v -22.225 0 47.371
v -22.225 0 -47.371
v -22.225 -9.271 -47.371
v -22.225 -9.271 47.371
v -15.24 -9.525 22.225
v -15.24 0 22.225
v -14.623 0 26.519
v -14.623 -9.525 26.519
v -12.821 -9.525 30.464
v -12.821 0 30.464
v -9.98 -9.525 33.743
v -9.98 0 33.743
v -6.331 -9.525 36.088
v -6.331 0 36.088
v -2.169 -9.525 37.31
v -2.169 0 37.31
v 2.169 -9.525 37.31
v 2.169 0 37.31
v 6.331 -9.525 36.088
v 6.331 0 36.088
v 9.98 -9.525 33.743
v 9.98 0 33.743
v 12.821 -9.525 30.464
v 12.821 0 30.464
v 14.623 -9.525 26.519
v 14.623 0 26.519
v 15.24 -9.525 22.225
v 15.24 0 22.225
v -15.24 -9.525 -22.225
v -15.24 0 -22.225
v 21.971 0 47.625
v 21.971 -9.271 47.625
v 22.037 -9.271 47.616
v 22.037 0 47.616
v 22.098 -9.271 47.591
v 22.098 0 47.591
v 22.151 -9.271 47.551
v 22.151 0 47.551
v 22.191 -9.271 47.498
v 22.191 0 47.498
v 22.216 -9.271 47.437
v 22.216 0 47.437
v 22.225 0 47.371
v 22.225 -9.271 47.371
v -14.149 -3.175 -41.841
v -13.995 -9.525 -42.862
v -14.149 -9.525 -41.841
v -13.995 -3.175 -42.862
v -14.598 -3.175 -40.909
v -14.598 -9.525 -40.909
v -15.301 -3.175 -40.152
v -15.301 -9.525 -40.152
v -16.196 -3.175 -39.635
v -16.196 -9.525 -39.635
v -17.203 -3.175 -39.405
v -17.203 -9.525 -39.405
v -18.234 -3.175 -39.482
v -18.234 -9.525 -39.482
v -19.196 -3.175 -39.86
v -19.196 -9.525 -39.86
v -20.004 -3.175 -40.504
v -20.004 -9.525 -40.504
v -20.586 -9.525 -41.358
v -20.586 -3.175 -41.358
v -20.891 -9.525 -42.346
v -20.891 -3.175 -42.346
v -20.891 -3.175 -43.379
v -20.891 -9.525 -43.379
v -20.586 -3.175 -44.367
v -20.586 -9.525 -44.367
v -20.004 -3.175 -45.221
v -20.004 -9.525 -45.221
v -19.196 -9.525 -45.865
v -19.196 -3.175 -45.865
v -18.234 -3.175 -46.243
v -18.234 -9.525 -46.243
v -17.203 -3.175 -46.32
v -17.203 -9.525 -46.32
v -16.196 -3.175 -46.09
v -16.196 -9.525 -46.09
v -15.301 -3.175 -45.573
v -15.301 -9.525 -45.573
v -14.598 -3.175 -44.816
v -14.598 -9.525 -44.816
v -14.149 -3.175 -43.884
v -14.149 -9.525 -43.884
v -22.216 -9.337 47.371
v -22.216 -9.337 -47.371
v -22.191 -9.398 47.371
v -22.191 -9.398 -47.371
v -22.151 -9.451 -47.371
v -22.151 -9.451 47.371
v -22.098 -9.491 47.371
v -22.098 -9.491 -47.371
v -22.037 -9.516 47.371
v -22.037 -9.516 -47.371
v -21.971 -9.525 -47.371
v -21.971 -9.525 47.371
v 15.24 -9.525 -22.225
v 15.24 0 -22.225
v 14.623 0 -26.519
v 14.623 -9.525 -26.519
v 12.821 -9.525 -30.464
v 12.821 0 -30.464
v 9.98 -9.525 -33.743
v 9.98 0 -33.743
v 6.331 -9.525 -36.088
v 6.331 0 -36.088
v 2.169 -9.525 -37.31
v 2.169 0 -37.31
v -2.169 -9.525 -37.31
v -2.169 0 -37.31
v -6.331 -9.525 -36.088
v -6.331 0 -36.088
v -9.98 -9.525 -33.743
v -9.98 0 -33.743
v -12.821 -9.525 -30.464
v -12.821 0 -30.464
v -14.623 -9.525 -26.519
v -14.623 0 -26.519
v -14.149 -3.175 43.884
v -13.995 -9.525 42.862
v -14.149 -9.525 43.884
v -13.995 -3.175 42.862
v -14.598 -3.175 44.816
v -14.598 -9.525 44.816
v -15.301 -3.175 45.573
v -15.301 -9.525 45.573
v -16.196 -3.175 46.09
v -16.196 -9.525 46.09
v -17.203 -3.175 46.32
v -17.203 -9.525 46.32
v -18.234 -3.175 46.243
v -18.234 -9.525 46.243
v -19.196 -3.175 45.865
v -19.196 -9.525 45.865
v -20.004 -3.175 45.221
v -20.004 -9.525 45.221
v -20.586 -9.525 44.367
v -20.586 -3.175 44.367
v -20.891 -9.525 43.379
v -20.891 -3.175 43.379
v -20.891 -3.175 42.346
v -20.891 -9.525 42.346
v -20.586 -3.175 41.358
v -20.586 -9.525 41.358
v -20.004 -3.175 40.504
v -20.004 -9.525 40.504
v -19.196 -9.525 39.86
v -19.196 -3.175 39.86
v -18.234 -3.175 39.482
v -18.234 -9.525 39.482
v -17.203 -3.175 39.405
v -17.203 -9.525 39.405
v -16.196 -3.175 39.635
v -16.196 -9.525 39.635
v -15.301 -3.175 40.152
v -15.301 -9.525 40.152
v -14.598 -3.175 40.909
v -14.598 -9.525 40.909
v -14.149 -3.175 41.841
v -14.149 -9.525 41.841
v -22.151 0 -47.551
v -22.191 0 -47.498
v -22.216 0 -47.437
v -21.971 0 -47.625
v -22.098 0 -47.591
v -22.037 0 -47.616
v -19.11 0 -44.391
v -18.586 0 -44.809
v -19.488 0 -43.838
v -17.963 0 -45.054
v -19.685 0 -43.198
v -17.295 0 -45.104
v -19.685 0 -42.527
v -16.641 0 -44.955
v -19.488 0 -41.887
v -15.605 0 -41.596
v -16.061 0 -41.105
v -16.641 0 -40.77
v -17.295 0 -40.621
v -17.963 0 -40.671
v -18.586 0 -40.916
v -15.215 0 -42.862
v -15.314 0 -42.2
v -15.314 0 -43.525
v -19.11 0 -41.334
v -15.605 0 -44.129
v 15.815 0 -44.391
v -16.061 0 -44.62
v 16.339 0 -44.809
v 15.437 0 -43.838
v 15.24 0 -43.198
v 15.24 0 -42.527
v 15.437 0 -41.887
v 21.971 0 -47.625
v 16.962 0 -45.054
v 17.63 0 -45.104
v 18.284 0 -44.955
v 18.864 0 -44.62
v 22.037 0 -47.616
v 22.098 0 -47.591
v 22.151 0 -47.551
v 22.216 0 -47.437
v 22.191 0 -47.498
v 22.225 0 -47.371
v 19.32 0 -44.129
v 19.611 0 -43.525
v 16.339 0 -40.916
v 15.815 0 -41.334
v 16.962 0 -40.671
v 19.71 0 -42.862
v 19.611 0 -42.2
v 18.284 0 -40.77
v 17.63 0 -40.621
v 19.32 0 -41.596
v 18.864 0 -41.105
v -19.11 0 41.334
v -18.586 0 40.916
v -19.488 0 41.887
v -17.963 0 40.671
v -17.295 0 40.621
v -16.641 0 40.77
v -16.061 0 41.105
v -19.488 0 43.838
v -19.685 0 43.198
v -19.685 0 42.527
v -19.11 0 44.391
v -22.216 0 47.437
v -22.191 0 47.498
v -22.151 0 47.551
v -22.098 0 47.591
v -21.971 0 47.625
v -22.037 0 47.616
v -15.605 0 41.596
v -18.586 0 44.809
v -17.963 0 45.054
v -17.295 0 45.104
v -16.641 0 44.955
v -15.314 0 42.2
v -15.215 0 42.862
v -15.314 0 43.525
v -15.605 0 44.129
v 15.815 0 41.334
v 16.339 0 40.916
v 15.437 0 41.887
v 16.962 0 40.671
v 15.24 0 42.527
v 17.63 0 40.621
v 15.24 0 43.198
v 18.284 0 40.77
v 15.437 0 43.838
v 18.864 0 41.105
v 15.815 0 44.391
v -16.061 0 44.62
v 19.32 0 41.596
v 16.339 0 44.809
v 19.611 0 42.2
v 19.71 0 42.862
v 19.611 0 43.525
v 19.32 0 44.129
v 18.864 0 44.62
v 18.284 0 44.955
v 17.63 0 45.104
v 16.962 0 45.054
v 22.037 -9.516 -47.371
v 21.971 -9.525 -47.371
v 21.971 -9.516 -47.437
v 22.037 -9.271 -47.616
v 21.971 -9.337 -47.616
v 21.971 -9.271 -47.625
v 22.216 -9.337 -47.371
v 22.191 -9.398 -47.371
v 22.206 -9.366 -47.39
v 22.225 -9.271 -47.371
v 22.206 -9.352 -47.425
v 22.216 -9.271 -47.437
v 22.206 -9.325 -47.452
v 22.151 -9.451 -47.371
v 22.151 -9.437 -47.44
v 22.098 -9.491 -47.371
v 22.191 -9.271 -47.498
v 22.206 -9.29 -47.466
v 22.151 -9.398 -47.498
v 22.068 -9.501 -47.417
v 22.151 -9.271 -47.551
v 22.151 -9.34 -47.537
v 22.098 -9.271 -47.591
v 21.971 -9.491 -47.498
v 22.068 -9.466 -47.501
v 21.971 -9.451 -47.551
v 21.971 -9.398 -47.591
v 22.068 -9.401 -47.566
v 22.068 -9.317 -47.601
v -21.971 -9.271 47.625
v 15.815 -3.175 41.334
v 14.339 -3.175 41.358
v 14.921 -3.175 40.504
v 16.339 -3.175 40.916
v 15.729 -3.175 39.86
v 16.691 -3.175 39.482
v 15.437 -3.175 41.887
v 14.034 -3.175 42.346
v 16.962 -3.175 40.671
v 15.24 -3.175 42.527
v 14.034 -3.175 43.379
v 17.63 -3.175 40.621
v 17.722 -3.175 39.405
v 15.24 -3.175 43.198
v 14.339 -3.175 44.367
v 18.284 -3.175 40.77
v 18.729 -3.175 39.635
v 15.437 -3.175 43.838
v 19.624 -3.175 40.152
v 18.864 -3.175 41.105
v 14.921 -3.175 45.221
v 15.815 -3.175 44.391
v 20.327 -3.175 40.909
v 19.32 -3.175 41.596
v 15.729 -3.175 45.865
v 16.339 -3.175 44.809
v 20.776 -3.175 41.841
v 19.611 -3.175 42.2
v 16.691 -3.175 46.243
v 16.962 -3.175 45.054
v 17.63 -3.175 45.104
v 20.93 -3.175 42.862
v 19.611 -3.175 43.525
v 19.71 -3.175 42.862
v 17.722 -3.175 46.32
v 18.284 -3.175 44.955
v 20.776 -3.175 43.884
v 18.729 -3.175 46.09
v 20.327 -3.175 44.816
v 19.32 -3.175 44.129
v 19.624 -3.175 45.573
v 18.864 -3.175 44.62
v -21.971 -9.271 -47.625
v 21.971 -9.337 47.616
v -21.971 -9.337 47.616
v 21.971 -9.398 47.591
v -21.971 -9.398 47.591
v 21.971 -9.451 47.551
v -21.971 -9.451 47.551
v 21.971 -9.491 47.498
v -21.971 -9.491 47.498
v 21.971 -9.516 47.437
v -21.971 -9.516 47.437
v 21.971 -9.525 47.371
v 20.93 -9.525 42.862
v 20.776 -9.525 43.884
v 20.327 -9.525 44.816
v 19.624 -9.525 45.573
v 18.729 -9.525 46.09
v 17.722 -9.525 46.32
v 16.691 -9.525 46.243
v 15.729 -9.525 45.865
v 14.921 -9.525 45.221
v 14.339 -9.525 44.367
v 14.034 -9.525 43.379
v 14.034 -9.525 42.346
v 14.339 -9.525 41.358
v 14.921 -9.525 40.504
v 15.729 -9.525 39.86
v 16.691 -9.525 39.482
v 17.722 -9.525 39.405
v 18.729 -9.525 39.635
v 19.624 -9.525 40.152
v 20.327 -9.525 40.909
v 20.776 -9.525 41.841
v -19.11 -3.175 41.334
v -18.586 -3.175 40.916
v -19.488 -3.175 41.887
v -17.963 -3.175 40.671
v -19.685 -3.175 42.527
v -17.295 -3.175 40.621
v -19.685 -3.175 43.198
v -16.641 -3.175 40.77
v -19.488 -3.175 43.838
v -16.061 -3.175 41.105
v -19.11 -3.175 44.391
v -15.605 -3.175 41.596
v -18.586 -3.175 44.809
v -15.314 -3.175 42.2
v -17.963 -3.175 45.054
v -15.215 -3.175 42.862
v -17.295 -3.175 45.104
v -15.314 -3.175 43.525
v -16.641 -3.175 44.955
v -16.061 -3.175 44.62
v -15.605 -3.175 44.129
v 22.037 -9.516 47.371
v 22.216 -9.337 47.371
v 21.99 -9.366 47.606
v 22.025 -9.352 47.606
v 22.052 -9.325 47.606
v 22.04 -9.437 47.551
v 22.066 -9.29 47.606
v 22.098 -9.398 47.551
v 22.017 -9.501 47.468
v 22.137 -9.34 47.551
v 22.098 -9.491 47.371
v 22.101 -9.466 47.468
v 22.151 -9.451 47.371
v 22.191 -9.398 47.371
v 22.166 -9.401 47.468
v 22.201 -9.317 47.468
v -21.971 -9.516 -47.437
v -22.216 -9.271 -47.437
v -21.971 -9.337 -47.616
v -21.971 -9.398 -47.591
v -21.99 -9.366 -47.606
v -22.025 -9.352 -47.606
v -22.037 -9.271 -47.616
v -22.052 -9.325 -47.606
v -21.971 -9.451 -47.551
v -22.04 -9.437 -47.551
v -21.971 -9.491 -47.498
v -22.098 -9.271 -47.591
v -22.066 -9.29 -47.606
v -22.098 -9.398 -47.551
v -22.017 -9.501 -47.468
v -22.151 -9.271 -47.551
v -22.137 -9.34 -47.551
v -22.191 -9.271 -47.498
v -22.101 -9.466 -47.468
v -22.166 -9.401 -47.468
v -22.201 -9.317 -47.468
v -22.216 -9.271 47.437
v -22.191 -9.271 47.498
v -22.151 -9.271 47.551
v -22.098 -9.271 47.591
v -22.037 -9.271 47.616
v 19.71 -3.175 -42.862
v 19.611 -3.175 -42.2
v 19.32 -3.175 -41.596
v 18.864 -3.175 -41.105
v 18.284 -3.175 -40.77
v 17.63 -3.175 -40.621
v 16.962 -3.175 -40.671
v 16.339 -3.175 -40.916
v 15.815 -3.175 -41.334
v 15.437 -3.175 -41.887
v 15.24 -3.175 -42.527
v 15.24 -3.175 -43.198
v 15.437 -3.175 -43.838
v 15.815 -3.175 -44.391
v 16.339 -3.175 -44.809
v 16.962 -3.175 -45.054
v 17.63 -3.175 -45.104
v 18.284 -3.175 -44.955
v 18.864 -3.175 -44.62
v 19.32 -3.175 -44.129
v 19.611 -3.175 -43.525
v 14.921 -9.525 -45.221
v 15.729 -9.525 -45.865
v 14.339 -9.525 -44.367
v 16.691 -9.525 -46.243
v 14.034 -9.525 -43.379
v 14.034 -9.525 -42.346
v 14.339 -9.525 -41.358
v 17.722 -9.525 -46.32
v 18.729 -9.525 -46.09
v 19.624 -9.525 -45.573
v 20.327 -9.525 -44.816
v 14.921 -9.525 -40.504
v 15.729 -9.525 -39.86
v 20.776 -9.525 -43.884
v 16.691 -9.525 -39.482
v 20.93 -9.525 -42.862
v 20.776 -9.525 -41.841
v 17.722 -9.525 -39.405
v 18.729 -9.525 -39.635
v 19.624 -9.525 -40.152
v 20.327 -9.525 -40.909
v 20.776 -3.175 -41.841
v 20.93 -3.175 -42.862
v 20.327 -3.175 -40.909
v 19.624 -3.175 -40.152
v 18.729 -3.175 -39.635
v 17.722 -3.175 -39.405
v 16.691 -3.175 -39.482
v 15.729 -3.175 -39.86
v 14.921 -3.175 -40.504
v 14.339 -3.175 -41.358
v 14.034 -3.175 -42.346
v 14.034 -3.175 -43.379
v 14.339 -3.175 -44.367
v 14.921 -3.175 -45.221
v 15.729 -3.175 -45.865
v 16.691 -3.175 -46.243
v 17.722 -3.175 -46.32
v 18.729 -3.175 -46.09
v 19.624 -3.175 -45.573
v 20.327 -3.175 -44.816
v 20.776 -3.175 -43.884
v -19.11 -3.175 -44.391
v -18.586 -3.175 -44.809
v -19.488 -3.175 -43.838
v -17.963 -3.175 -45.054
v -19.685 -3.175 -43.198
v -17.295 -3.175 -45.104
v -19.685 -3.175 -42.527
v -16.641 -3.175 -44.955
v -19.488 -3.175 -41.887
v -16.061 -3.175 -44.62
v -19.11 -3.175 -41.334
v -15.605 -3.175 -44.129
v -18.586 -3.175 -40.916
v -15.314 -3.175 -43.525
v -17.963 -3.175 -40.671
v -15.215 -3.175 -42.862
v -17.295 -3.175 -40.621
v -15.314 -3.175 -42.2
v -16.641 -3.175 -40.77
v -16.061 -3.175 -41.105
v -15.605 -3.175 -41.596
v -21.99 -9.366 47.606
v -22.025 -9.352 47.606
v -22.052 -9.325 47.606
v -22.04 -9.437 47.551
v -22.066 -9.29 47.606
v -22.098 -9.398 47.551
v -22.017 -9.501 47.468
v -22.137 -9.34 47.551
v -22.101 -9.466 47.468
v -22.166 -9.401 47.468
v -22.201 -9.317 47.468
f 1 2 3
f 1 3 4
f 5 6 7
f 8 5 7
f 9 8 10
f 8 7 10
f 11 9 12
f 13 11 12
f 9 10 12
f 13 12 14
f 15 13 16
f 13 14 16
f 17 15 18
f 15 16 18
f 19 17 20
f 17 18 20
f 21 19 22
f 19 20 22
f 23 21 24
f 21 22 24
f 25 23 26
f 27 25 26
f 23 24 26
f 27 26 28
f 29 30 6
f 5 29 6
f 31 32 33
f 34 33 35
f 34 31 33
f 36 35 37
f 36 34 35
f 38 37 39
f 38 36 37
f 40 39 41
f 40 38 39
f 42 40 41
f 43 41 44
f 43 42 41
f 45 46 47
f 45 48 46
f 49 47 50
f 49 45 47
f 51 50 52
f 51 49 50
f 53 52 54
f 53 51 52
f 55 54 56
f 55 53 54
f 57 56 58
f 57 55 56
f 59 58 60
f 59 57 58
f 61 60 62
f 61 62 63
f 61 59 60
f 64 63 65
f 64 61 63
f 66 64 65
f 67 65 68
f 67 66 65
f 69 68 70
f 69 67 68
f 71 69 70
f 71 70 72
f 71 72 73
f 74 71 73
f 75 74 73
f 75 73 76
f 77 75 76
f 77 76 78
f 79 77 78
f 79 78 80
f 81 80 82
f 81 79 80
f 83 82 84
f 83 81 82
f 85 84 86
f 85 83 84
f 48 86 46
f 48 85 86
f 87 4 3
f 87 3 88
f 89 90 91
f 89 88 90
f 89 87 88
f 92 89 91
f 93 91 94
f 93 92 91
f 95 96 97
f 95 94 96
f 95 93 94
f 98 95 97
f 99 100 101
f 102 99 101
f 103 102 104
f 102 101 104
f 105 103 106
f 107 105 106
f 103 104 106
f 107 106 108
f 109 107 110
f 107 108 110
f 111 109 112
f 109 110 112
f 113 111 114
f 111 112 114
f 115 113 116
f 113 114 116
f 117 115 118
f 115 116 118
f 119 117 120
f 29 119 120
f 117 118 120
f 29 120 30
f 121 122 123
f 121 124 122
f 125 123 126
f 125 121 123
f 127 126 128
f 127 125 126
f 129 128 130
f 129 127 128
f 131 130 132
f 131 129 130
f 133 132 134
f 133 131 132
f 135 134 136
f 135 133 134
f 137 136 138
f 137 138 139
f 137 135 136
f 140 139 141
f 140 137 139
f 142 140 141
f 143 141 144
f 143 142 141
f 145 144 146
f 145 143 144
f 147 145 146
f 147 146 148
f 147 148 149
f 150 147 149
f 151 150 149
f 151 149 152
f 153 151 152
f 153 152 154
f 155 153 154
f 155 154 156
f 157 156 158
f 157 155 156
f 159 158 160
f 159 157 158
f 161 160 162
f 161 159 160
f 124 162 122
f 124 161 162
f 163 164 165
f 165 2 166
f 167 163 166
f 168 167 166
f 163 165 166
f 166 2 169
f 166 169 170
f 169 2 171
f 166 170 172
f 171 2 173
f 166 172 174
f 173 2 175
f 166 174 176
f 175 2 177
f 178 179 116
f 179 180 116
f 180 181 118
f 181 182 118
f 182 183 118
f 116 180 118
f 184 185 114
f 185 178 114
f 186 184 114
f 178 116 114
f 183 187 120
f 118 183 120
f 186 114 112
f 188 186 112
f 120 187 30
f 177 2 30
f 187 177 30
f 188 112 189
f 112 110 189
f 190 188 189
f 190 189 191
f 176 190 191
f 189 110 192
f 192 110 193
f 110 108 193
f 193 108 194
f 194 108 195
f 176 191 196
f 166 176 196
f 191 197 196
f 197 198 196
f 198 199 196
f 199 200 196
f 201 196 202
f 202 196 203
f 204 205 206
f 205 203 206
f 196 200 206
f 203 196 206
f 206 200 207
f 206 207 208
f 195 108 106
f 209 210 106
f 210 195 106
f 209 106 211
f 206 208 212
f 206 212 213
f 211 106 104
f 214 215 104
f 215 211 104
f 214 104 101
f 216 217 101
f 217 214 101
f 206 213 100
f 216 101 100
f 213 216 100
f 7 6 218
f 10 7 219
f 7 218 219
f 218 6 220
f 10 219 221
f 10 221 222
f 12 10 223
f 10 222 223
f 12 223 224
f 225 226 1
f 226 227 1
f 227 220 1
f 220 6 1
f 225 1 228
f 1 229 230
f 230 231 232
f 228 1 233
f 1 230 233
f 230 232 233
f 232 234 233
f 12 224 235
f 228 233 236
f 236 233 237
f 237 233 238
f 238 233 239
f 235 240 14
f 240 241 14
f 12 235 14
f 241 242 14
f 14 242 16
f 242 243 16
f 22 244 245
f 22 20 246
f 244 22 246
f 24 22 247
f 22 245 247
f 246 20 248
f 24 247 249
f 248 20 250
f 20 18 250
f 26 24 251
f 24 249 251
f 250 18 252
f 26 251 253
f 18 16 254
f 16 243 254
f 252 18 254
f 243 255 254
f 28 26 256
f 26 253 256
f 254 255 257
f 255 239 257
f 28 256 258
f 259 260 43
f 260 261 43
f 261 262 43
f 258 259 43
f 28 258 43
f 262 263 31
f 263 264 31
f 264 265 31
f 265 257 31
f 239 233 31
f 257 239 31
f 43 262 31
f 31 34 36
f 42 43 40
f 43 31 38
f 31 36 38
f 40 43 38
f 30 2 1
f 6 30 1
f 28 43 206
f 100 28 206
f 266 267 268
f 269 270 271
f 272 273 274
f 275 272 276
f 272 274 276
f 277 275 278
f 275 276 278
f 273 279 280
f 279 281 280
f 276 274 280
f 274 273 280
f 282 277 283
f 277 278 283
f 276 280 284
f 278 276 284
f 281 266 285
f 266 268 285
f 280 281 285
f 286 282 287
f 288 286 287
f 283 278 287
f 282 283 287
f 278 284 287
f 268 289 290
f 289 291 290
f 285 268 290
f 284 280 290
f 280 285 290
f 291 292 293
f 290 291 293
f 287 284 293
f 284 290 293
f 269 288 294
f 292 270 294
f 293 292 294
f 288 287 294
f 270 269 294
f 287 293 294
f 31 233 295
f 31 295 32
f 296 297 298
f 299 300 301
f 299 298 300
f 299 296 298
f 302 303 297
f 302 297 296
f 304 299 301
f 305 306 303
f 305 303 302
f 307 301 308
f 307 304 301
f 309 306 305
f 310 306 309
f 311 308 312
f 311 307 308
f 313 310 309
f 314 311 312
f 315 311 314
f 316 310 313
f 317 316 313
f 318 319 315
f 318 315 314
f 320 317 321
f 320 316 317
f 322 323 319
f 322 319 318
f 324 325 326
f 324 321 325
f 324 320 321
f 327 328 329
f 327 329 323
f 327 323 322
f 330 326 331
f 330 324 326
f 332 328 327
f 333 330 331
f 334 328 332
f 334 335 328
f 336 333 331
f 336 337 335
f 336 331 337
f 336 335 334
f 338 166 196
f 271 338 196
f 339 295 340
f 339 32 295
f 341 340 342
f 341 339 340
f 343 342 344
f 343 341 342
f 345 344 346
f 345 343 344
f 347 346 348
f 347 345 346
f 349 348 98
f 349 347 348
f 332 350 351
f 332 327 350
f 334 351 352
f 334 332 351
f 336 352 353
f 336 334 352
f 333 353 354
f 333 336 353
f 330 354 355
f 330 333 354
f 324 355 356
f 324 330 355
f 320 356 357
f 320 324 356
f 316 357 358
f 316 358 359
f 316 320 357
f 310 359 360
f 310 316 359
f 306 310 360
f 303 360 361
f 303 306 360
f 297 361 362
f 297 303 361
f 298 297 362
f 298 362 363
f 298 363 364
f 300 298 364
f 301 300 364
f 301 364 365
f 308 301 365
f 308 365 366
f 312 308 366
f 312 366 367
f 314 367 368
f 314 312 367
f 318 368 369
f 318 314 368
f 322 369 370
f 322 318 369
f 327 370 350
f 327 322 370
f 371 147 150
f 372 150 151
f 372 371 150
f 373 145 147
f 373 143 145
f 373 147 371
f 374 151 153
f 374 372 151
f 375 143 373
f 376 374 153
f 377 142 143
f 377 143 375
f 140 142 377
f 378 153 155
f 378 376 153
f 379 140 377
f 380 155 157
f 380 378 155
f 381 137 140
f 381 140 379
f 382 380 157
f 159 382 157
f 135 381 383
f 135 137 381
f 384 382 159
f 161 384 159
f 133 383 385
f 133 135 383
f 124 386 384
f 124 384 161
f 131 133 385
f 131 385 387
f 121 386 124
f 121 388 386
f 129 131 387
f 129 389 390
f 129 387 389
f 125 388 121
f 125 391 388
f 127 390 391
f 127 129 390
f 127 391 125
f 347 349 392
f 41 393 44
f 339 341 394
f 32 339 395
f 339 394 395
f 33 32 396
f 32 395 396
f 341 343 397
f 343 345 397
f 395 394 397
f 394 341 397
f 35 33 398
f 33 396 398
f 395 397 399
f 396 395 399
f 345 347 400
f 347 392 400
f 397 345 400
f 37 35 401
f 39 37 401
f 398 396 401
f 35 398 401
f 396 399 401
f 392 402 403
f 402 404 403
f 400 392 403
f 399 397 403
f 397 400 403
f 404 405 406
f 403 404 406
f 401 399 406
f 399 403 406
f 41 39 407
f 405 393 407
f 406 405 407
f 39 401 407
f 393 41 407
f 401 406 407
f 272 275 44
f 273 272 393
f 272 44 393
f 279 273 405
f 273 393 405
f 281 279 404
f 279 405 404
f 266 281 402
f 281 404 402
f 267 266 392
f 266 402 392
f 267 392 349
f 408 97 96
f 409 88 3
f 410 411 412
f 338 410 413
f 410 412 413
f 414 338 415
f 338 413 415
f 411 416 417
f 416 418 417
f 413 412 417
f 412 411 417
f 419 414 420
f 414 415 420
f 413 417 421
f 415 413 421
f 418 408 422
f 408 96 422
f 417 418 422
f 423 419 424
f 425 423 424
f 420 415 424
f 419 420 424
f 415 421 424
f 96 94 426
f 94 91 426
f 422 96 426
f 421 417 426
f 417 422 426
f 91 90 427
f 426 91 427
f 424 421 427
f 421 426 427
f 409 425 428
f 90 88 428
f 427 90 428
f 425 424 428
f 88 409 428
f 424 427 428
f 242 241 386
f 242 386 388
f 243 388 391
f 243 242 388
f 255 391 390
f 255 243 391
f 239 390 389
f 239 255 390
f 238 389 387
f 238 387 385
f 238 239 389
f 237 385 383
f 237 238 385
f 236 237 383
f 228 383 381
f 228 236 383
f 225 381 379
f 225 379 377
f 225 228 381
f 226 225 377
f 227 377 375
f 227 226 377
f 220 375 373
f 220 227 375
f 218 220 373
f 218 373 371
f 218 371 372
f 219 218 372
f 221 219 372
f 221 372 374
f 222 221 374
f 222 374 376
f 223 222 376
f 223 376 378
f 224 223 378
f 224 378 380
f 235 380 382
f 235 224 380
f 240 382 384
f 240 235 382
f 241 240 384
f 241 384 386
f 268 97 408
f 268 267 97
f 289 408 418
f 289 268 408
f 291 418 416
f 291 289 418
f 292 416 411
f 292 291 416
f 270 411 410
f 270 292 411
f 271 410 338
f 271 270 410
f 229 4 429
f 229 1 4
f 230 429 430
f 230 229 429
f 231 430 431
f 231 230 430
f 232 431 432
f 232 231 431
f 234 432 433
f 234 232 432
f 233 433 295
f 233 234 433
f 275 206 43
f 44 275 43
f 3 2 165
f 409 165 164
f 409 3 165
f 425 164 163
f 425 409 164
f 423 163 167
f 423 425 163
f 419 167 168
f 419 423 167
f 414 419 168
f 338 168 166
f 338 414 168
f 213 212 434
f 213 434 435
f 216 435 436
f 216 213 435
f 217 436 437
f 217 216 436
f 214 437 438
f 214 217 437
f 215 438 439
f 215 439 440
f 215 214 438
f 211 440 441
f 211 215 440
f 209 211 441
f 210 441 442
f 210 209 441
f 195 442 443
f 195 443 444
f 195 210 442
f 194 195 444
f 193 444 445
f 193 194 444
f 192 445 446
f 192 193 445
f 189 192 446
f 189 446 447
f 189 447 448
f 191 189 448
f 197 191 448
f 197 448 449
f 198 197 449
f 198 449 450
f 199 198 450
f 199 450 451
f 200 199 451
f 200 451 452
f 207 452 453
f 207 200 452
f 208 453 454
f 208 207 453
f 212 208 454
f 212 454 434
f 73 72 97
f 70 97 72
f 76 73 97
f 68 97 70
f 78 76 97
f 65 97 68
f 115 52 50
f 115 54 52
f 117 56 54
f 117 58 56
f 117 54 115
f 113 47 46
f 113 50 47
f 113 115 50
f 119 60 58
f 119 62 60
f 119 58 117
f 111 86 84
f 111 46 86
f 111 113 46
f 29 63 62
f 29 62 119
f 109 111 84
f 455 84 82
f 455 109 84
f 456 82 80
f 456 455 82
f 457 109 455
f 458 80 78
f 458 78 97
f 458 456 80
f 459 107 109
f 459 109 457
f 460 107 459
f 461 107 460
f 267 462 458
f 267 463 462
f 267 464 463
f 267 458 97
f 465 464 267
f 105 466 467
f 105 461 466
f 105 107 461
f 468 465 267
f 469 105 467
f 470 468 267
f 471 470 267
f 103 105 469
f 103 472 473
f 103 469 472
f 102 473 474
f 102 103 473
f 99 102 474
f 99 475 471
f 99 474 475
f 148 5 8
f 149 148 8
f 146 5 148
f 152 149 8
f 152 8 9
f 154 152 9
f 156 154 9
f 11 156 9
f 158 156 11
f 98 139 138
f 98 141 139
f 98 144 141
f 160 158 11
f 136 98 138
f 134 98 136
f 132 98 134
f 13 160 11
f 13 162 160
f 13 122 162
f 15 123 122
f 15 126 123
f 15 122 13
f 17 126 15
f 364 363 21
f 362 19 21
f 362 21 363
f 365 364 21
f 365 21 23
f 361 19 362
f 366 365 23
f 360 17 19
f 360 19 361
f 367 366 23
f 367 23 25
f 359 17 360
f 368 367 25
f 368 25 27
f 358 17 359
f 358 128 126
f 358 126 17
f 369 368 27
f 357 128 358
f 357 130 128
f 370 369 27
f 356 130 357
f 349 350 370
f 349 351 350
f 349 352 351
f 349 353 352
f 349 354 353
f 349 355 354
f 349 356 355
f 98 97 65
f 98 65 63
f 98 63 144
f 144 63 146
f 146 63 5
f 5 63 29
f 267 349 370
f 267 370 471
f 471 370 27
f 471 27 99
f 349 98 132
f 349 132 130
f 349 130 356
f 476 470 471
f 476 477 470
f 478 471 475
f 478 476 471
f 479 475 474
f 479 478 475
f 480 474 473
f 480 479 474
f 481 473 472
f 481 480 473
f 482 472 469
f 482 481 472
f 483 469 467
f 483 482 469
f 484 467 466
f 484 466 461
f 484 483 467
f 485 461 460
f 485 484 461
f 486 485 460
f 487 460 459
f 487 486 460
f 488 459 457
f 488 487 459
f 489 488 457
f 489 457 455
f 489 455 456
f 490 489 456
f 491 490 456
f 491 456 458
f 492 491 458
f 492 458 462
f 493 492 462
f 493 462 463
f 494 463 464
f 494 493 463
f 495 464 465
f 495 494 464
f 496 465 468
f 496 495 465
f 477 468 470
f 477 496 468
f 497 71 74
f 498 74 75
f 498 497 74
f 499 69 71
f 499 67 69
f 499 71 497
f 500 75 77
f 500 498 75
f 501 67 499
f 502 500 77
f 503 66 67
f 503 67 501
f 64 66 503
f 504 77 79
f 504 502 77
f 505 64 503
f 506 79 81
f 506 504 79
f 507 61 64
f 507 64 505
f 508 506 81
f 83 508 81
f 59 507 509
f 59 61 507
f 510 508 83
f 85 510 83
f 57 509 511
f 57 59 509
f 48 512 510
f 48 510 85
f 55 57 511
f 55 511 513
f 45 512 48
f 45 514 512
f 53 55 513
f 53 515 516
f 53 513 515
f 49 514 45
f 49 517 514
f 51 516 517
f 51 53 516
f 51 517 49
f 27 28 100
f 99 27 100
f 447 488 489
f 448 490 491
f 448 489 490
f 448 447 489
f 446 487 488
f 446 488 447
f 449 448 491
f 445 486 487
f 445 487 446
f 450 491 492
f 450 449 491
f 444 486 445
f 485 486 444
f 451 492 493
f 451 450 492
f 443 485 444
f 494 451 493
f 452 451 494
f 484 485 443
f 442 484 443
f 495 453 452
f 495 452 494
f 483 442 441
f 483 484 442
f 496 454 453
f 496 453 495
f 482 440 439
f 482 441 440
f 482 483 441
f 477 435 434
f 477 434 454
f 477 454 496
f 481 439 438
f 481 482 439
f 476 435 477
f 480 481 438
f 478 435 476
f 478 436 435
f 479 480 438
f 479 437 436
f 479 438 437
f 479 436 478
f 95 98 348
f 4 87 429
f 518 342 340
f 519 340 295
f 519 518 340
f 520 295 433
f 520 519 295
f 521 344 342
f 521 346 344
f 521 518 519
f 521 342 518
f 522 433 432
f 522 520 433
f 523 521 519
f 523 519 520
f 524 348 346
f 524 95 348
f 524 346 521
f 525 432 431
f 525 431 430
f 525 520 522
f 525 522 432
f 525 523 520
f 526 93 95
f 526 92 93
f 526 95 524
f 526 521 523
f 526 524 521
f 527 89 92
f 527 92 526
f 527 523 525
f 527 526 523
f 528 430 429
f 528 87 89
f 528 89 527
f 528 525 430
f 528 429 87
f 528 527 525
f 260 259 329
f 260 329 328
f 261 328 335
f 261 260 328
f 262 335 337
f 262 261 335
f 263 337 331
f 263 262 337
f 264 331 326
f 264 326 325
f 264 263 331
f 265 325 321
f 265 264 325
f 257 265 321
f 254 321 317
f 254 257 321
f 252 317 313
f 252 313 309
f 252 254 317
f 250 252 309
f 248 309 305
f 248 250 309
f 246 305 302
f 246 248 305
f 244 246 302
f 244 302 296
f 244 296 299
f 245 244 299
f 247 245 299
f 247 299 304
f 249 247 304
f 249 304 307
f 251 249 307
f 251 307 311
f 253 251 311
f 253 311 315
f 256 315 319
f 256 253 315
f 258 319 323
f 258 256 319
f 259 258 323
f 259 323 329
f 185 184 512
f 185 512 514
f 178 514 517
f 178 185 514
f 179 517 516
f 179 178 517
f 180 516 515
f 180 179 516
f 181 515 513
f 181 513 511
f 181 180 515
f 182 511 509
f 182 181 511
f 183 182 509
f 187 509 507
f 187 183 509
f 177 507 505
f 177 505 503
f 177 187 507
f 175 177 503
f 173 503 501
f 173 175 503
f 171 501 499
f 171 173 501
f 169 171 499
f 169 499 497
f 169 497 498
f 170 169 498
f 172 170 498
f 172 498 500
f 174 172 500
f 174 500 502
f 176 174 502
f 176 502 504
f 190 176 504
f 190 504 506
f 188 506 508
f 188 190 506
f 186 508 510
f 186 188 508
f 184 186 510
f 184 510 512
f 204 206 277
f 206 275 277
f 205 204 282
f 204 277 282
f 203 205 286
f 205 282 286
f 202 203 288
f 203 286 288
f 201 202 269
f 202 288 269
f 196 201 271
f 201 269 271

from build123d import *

# Parameters (mm, degrees)
F0_W      = 44.45
F0_H      = 95.25
F0_R      = 3.4671
F1_DEPTH  = 6.35
F0_R_2    = 2.2479
F1_FACE_W = 44.45
F1_FACE_H = 95.25
F1_FACE_R = 3.4671
F2_DEPTH  = 3.175
F3_R      = 0.254


# Not quite as in the source:
# - a feature names something its author has since deleted; it is built from what else it names


with BuildPart() as f1:
    # F0 (on Front) → F1 (new body)
    with BuildSketch(Plane.XZ):
        Rectangle(F0_W, F0_H)
        with Locations((-17.4625, -42.8625)):
            Circle(F0_R, mode=Mode.SUBTRACT)
        with Locations((17.4625, -42.8625)):
            Circle(F0_R, mode=Mode.SUBTRACT)
        with Locations((-17.4625, 42.8625)):
            Circle(F0_R, mode=Mode.SUBTRACT)
        with BuildLine():
            ThreePointArc((-15.24, 22.225), (0, 37.465), (15.24, 22.225))
            Line((15.24, 22.225), (15.24, -22.225))
            ThreePointArc((15.24, -22.225), (0, -37.465), (-15.24, -22.225))
            Line((-15.24, -22.225), (-15.24, 22.225))
        make_face(mode=Mode.SUBTRACT)
        with Locations((17.4625, 42.8625)):
            Circle(F0_R, mode=Mode.SUBTRACT)
    extrude(amount=F1_DEPTH)

    # F0 (on Front) + F1_face (on face) → F2 (join)
    with BuildSketch(Plane.XZ):
        Rectangle(F0_W, F0_H)
        with Locations((-17.4625, -42.8625)):
            Circle(F0_R, mode=Mode.SUBTRACT)
        with Locations((17.4625, -42.8625)):
            Circle(F0_R, mode=Mode.SUBTRACT)
        with Locations((-17.4625, 42.8625)):
            Circle(F0_R, mode=Mode.SUBTRACT)
        with BuildLine():
            ThreePointArc((-15.24, 22.225), (0, 37.465), (15.24, 22.225))
            Line((15.24, 22.225), (15.24, -22.225))
            ThreePointArc((15.24, -22.225), (0, -37.465), (-15.24, -22.225))
            Line((-15.24, -22.225), (-15.24, 22.225))
        make_face(mode=Mode.SUBTRACT)
        with Locations((17.4625, 42.8625)):
            Circle(F0_R, mode=Mode.SUBTRACT)
        with Locations((-17.4625, 42.8625)):
            Circle(F0_R)
        with Locations((-17.4625, 42.8625)):
            Circle(F0_R_2, mode=Mode.SUBTRACT)
        with Locations((17.4625, 42.8625)):
            Circle(F0_R)
        with Locations((17.4625, 42.8625)):
            Circle(F0_R_2, mode=Mode.SUBTRACT)
        with Locations((-17.4625, -42.8625)):
            Circle(F0_R)
        with Locations((-17.4625, -42.8625)):
            Circle(F0_R_2, mode=Mode.SUBTRACT)
        with Locations((17.4625, -42.8625)):
            Circle(F0_R)
        with Locations((17.4625, -42.8625)):
            Circle(F0_R_2, mode=Mode.SUBTRACT)
    with BuildSketch(Plane.XZ.offset(6.35)):
        Rectangle(F1_FACE_W, F1_FACE_H)
        with Locations((-17.4625, -42.8625)):
            Circle(F1_FACE_R, mode=Mode.SUBTRACT)
        with Locations((17.4625, -42.8625)):
            Circle(F1_FACE_R, mode=Mode.SUBTRACT)
        with Locations((-17.4625, 42.8625)):
            Circle(F1_FACE_R, mode=Mode.SUBTRACT)
        with BuildLine():
            Line((-15.24, -22.225), (-15.24, 22.225))
            ThreePointArc((-15.24, 22.225), (0, 37.465), (15.24, 22.225))
            Line((15.24, 22.225), (15.24, -22.225))
            ThreePointArc((15.24, -22.225), (0, -37.465), (-15.24, -22.225))
        make_face(mode=Mode.SUBTRACT)
        with Locations((17.4625, 42.8625)):
            Circle(F1_FACE_R, mode=Mode.SUBTRACT)
    extrude(amount=F2_DEPTH)

    # F3
    f3_edges = [f1.edges().sort_by_distance(p)[0] for p in [
        (-22.225, -9.525, 0),
        (0, -9.525, -47.625),
        (22.225, -9.525, 0),
        (0, -9.525, 47.625),
        (-22.225, -4.7625, 47.625),
        (22.225, -4.7625, 47.625),
        (22.225, -4.7625, -47.625),
        (-22.225, -4.7625, -47.625),
    ]]
    fillet(f3_edges, radius=F3_R)


solid = f1.part
